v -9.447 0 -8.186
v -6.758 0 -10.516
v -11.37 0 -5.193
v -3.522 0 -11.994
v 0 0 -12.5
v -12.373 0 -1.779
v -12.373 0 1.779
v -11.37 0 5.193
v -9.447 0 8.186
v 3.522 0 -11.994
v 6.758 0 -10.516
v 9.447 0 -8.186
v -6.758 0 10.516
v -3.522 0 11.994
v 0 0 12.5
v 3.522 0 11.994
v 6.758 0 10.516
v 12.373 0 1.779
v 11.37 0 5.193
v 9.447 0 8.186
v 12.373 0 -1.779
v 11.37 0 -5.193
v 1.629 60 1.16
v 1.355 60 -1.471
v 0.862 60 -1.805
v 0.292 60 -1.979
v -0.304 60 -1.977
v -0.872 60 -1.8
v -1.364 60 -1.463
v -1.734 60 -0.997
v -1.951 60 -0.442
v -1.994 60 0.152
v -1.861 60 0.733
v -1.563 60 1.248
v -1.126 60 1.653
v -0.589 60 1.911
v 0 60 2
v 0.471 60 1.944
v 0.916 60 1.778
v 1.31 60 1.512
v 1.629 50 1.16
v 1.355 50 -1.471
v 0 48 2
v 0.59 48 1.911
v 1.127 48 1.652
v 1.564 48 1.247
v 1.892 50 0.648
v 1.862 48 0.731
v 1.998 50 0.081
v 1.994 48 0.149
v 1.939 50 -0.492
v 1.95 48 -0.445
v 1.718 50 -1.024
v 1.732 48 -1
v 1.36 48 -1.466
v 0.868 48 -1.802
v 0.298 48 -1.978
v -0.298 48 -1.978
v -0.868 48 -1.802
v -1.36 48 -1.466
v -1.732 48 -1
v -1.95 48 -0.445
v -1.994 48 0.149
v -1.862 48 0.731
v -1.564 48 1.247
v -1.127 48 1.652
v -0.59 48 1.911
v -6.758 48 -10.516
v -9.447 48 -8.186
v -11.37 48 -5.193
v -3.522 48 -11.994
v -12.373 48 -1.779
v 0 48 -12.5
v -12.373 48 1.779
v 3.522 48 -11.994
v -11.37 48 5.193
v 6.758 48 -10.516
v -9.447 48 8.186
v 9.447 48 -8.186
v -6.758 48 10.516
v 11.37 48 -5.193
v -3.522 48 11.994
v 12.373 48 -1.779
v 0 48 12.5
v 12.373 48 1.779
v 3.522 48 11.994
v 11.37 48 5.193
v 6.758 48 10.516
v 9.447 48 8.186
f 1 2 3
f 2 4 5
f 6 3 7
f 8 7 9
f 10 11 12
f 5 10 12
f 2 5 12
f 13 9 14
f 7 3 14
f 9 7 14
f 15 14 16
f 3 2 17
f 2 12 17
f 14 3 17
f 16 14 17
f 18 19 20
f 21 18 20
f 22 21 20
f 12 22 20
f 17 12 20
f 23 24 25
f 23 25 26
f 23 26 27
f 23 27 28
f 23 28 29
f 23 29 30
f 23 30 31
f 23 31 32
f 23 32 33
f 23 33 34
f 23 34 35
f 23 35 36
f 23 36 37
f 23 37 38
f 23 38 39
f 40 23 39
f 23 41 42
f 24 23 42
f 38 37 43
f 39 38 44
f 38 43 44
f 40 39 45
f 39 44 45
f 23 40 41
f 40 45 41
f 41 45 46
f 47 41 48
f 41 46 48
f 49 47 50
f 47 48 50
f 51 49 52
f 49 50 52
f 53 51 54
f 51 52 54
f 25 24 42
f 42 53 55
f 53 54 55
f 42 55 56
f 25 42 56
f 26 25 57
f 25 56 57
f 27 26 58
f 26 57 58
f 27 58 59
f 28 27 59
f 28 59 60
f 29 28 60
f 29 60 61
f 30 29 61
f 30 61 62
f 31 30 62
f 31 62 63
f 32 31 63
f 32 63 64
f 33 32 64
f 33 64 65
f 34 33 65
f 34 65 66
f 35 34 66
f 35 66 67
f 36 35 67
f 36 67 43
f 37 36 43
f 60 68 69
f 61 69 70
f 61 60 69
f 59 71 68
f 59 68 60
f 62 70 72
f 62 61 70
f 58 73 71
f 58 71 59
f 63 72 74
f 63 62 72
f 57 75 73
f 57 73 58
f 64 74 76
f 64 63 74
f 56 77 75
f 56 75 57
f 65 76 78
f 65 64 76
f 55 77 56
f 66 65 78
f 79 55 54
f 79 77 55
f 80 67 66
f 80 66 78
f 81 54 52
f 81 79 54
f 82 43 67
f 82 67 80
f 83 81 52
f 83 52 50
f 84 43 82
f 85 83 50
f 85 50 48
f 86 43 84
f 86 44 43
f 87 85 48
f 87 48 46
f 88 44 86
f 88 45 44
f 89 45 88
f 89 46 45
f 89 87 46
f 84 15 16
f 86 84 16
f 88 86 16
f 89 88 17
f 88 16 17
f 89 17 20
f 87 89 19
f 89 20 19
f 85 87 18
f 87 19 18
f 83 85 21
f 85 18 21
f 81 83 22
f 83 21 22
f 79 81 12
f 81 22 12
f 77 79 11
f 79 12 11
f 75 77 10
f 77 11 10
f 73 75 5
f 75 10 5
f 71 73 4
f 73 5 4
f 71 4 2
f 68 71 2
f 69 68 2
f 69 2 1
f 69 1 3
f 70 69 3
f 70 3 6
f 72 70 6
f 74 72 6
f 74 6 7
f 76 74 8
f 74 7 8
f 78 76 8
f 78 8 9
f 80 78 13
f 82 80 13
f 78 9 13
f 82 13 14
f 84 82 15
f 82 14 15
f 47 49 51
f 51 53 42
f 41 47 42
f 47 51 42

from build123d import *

# Parameters (mm, degrees)
SKETCH_1_R          = 12.5
EXTRUDE_1_DEPTH     = 48
SKETCH_2_R          = 2
EXTRUDE_2_DEPTH     = 12
CUT_EXTRUDE_START   = -10
CUT_EXTRUDE_1_DEPTH = 10


with BuildPart() as part:
    # 草图1 → 凸台-拉伸1 (new body)
    with BuildSketch(Plane(origin=(0, 0, 0), x_dir=(1, 0, 0), z_dir=(0, 1, 0))):
        with Locations(Location((0, 0, 0), (0, 0, 270))):
            Circle(SKETCH_1_R)
    extrude(amount=EXTRUDE_1_DEPTH)

    # 草图2 → 凸台-拉伸2 (add)
    with BuildSketch(Plane(origin=(0, 48, 0), x_dir=(1, 0, 0), z_dir=(0, 1, 0))):
        with Locations(Location((0, 0, 0), (0, 0, 270))):
            Circle(SKETCH_2_R)
    extrude(amount=EXTRUDE_2_DEPTH)

    # 草图3 → 切除-拉伸1 (cut)
    with BuildSketch(Plane(origin=(0, 60, 0), x_dir=(1, 0, 0), z_dir=(0, 1, 0)).offset(CUT_EXTRUDE_START)):
        with BuildLine():
            Line((1.62898558, -1.160347353), (1.354869647, 1.471165606))
            ThreePointArc((1.354869647, 1.471165606), (1.989236818, 0.207212169), (1.62898558, -1.160347353))
        make_face()
    extrude(amount=CUT_EXTRUDE_1_DEPTH, mode=Mode.SUBTRACT)


solid = part.part
